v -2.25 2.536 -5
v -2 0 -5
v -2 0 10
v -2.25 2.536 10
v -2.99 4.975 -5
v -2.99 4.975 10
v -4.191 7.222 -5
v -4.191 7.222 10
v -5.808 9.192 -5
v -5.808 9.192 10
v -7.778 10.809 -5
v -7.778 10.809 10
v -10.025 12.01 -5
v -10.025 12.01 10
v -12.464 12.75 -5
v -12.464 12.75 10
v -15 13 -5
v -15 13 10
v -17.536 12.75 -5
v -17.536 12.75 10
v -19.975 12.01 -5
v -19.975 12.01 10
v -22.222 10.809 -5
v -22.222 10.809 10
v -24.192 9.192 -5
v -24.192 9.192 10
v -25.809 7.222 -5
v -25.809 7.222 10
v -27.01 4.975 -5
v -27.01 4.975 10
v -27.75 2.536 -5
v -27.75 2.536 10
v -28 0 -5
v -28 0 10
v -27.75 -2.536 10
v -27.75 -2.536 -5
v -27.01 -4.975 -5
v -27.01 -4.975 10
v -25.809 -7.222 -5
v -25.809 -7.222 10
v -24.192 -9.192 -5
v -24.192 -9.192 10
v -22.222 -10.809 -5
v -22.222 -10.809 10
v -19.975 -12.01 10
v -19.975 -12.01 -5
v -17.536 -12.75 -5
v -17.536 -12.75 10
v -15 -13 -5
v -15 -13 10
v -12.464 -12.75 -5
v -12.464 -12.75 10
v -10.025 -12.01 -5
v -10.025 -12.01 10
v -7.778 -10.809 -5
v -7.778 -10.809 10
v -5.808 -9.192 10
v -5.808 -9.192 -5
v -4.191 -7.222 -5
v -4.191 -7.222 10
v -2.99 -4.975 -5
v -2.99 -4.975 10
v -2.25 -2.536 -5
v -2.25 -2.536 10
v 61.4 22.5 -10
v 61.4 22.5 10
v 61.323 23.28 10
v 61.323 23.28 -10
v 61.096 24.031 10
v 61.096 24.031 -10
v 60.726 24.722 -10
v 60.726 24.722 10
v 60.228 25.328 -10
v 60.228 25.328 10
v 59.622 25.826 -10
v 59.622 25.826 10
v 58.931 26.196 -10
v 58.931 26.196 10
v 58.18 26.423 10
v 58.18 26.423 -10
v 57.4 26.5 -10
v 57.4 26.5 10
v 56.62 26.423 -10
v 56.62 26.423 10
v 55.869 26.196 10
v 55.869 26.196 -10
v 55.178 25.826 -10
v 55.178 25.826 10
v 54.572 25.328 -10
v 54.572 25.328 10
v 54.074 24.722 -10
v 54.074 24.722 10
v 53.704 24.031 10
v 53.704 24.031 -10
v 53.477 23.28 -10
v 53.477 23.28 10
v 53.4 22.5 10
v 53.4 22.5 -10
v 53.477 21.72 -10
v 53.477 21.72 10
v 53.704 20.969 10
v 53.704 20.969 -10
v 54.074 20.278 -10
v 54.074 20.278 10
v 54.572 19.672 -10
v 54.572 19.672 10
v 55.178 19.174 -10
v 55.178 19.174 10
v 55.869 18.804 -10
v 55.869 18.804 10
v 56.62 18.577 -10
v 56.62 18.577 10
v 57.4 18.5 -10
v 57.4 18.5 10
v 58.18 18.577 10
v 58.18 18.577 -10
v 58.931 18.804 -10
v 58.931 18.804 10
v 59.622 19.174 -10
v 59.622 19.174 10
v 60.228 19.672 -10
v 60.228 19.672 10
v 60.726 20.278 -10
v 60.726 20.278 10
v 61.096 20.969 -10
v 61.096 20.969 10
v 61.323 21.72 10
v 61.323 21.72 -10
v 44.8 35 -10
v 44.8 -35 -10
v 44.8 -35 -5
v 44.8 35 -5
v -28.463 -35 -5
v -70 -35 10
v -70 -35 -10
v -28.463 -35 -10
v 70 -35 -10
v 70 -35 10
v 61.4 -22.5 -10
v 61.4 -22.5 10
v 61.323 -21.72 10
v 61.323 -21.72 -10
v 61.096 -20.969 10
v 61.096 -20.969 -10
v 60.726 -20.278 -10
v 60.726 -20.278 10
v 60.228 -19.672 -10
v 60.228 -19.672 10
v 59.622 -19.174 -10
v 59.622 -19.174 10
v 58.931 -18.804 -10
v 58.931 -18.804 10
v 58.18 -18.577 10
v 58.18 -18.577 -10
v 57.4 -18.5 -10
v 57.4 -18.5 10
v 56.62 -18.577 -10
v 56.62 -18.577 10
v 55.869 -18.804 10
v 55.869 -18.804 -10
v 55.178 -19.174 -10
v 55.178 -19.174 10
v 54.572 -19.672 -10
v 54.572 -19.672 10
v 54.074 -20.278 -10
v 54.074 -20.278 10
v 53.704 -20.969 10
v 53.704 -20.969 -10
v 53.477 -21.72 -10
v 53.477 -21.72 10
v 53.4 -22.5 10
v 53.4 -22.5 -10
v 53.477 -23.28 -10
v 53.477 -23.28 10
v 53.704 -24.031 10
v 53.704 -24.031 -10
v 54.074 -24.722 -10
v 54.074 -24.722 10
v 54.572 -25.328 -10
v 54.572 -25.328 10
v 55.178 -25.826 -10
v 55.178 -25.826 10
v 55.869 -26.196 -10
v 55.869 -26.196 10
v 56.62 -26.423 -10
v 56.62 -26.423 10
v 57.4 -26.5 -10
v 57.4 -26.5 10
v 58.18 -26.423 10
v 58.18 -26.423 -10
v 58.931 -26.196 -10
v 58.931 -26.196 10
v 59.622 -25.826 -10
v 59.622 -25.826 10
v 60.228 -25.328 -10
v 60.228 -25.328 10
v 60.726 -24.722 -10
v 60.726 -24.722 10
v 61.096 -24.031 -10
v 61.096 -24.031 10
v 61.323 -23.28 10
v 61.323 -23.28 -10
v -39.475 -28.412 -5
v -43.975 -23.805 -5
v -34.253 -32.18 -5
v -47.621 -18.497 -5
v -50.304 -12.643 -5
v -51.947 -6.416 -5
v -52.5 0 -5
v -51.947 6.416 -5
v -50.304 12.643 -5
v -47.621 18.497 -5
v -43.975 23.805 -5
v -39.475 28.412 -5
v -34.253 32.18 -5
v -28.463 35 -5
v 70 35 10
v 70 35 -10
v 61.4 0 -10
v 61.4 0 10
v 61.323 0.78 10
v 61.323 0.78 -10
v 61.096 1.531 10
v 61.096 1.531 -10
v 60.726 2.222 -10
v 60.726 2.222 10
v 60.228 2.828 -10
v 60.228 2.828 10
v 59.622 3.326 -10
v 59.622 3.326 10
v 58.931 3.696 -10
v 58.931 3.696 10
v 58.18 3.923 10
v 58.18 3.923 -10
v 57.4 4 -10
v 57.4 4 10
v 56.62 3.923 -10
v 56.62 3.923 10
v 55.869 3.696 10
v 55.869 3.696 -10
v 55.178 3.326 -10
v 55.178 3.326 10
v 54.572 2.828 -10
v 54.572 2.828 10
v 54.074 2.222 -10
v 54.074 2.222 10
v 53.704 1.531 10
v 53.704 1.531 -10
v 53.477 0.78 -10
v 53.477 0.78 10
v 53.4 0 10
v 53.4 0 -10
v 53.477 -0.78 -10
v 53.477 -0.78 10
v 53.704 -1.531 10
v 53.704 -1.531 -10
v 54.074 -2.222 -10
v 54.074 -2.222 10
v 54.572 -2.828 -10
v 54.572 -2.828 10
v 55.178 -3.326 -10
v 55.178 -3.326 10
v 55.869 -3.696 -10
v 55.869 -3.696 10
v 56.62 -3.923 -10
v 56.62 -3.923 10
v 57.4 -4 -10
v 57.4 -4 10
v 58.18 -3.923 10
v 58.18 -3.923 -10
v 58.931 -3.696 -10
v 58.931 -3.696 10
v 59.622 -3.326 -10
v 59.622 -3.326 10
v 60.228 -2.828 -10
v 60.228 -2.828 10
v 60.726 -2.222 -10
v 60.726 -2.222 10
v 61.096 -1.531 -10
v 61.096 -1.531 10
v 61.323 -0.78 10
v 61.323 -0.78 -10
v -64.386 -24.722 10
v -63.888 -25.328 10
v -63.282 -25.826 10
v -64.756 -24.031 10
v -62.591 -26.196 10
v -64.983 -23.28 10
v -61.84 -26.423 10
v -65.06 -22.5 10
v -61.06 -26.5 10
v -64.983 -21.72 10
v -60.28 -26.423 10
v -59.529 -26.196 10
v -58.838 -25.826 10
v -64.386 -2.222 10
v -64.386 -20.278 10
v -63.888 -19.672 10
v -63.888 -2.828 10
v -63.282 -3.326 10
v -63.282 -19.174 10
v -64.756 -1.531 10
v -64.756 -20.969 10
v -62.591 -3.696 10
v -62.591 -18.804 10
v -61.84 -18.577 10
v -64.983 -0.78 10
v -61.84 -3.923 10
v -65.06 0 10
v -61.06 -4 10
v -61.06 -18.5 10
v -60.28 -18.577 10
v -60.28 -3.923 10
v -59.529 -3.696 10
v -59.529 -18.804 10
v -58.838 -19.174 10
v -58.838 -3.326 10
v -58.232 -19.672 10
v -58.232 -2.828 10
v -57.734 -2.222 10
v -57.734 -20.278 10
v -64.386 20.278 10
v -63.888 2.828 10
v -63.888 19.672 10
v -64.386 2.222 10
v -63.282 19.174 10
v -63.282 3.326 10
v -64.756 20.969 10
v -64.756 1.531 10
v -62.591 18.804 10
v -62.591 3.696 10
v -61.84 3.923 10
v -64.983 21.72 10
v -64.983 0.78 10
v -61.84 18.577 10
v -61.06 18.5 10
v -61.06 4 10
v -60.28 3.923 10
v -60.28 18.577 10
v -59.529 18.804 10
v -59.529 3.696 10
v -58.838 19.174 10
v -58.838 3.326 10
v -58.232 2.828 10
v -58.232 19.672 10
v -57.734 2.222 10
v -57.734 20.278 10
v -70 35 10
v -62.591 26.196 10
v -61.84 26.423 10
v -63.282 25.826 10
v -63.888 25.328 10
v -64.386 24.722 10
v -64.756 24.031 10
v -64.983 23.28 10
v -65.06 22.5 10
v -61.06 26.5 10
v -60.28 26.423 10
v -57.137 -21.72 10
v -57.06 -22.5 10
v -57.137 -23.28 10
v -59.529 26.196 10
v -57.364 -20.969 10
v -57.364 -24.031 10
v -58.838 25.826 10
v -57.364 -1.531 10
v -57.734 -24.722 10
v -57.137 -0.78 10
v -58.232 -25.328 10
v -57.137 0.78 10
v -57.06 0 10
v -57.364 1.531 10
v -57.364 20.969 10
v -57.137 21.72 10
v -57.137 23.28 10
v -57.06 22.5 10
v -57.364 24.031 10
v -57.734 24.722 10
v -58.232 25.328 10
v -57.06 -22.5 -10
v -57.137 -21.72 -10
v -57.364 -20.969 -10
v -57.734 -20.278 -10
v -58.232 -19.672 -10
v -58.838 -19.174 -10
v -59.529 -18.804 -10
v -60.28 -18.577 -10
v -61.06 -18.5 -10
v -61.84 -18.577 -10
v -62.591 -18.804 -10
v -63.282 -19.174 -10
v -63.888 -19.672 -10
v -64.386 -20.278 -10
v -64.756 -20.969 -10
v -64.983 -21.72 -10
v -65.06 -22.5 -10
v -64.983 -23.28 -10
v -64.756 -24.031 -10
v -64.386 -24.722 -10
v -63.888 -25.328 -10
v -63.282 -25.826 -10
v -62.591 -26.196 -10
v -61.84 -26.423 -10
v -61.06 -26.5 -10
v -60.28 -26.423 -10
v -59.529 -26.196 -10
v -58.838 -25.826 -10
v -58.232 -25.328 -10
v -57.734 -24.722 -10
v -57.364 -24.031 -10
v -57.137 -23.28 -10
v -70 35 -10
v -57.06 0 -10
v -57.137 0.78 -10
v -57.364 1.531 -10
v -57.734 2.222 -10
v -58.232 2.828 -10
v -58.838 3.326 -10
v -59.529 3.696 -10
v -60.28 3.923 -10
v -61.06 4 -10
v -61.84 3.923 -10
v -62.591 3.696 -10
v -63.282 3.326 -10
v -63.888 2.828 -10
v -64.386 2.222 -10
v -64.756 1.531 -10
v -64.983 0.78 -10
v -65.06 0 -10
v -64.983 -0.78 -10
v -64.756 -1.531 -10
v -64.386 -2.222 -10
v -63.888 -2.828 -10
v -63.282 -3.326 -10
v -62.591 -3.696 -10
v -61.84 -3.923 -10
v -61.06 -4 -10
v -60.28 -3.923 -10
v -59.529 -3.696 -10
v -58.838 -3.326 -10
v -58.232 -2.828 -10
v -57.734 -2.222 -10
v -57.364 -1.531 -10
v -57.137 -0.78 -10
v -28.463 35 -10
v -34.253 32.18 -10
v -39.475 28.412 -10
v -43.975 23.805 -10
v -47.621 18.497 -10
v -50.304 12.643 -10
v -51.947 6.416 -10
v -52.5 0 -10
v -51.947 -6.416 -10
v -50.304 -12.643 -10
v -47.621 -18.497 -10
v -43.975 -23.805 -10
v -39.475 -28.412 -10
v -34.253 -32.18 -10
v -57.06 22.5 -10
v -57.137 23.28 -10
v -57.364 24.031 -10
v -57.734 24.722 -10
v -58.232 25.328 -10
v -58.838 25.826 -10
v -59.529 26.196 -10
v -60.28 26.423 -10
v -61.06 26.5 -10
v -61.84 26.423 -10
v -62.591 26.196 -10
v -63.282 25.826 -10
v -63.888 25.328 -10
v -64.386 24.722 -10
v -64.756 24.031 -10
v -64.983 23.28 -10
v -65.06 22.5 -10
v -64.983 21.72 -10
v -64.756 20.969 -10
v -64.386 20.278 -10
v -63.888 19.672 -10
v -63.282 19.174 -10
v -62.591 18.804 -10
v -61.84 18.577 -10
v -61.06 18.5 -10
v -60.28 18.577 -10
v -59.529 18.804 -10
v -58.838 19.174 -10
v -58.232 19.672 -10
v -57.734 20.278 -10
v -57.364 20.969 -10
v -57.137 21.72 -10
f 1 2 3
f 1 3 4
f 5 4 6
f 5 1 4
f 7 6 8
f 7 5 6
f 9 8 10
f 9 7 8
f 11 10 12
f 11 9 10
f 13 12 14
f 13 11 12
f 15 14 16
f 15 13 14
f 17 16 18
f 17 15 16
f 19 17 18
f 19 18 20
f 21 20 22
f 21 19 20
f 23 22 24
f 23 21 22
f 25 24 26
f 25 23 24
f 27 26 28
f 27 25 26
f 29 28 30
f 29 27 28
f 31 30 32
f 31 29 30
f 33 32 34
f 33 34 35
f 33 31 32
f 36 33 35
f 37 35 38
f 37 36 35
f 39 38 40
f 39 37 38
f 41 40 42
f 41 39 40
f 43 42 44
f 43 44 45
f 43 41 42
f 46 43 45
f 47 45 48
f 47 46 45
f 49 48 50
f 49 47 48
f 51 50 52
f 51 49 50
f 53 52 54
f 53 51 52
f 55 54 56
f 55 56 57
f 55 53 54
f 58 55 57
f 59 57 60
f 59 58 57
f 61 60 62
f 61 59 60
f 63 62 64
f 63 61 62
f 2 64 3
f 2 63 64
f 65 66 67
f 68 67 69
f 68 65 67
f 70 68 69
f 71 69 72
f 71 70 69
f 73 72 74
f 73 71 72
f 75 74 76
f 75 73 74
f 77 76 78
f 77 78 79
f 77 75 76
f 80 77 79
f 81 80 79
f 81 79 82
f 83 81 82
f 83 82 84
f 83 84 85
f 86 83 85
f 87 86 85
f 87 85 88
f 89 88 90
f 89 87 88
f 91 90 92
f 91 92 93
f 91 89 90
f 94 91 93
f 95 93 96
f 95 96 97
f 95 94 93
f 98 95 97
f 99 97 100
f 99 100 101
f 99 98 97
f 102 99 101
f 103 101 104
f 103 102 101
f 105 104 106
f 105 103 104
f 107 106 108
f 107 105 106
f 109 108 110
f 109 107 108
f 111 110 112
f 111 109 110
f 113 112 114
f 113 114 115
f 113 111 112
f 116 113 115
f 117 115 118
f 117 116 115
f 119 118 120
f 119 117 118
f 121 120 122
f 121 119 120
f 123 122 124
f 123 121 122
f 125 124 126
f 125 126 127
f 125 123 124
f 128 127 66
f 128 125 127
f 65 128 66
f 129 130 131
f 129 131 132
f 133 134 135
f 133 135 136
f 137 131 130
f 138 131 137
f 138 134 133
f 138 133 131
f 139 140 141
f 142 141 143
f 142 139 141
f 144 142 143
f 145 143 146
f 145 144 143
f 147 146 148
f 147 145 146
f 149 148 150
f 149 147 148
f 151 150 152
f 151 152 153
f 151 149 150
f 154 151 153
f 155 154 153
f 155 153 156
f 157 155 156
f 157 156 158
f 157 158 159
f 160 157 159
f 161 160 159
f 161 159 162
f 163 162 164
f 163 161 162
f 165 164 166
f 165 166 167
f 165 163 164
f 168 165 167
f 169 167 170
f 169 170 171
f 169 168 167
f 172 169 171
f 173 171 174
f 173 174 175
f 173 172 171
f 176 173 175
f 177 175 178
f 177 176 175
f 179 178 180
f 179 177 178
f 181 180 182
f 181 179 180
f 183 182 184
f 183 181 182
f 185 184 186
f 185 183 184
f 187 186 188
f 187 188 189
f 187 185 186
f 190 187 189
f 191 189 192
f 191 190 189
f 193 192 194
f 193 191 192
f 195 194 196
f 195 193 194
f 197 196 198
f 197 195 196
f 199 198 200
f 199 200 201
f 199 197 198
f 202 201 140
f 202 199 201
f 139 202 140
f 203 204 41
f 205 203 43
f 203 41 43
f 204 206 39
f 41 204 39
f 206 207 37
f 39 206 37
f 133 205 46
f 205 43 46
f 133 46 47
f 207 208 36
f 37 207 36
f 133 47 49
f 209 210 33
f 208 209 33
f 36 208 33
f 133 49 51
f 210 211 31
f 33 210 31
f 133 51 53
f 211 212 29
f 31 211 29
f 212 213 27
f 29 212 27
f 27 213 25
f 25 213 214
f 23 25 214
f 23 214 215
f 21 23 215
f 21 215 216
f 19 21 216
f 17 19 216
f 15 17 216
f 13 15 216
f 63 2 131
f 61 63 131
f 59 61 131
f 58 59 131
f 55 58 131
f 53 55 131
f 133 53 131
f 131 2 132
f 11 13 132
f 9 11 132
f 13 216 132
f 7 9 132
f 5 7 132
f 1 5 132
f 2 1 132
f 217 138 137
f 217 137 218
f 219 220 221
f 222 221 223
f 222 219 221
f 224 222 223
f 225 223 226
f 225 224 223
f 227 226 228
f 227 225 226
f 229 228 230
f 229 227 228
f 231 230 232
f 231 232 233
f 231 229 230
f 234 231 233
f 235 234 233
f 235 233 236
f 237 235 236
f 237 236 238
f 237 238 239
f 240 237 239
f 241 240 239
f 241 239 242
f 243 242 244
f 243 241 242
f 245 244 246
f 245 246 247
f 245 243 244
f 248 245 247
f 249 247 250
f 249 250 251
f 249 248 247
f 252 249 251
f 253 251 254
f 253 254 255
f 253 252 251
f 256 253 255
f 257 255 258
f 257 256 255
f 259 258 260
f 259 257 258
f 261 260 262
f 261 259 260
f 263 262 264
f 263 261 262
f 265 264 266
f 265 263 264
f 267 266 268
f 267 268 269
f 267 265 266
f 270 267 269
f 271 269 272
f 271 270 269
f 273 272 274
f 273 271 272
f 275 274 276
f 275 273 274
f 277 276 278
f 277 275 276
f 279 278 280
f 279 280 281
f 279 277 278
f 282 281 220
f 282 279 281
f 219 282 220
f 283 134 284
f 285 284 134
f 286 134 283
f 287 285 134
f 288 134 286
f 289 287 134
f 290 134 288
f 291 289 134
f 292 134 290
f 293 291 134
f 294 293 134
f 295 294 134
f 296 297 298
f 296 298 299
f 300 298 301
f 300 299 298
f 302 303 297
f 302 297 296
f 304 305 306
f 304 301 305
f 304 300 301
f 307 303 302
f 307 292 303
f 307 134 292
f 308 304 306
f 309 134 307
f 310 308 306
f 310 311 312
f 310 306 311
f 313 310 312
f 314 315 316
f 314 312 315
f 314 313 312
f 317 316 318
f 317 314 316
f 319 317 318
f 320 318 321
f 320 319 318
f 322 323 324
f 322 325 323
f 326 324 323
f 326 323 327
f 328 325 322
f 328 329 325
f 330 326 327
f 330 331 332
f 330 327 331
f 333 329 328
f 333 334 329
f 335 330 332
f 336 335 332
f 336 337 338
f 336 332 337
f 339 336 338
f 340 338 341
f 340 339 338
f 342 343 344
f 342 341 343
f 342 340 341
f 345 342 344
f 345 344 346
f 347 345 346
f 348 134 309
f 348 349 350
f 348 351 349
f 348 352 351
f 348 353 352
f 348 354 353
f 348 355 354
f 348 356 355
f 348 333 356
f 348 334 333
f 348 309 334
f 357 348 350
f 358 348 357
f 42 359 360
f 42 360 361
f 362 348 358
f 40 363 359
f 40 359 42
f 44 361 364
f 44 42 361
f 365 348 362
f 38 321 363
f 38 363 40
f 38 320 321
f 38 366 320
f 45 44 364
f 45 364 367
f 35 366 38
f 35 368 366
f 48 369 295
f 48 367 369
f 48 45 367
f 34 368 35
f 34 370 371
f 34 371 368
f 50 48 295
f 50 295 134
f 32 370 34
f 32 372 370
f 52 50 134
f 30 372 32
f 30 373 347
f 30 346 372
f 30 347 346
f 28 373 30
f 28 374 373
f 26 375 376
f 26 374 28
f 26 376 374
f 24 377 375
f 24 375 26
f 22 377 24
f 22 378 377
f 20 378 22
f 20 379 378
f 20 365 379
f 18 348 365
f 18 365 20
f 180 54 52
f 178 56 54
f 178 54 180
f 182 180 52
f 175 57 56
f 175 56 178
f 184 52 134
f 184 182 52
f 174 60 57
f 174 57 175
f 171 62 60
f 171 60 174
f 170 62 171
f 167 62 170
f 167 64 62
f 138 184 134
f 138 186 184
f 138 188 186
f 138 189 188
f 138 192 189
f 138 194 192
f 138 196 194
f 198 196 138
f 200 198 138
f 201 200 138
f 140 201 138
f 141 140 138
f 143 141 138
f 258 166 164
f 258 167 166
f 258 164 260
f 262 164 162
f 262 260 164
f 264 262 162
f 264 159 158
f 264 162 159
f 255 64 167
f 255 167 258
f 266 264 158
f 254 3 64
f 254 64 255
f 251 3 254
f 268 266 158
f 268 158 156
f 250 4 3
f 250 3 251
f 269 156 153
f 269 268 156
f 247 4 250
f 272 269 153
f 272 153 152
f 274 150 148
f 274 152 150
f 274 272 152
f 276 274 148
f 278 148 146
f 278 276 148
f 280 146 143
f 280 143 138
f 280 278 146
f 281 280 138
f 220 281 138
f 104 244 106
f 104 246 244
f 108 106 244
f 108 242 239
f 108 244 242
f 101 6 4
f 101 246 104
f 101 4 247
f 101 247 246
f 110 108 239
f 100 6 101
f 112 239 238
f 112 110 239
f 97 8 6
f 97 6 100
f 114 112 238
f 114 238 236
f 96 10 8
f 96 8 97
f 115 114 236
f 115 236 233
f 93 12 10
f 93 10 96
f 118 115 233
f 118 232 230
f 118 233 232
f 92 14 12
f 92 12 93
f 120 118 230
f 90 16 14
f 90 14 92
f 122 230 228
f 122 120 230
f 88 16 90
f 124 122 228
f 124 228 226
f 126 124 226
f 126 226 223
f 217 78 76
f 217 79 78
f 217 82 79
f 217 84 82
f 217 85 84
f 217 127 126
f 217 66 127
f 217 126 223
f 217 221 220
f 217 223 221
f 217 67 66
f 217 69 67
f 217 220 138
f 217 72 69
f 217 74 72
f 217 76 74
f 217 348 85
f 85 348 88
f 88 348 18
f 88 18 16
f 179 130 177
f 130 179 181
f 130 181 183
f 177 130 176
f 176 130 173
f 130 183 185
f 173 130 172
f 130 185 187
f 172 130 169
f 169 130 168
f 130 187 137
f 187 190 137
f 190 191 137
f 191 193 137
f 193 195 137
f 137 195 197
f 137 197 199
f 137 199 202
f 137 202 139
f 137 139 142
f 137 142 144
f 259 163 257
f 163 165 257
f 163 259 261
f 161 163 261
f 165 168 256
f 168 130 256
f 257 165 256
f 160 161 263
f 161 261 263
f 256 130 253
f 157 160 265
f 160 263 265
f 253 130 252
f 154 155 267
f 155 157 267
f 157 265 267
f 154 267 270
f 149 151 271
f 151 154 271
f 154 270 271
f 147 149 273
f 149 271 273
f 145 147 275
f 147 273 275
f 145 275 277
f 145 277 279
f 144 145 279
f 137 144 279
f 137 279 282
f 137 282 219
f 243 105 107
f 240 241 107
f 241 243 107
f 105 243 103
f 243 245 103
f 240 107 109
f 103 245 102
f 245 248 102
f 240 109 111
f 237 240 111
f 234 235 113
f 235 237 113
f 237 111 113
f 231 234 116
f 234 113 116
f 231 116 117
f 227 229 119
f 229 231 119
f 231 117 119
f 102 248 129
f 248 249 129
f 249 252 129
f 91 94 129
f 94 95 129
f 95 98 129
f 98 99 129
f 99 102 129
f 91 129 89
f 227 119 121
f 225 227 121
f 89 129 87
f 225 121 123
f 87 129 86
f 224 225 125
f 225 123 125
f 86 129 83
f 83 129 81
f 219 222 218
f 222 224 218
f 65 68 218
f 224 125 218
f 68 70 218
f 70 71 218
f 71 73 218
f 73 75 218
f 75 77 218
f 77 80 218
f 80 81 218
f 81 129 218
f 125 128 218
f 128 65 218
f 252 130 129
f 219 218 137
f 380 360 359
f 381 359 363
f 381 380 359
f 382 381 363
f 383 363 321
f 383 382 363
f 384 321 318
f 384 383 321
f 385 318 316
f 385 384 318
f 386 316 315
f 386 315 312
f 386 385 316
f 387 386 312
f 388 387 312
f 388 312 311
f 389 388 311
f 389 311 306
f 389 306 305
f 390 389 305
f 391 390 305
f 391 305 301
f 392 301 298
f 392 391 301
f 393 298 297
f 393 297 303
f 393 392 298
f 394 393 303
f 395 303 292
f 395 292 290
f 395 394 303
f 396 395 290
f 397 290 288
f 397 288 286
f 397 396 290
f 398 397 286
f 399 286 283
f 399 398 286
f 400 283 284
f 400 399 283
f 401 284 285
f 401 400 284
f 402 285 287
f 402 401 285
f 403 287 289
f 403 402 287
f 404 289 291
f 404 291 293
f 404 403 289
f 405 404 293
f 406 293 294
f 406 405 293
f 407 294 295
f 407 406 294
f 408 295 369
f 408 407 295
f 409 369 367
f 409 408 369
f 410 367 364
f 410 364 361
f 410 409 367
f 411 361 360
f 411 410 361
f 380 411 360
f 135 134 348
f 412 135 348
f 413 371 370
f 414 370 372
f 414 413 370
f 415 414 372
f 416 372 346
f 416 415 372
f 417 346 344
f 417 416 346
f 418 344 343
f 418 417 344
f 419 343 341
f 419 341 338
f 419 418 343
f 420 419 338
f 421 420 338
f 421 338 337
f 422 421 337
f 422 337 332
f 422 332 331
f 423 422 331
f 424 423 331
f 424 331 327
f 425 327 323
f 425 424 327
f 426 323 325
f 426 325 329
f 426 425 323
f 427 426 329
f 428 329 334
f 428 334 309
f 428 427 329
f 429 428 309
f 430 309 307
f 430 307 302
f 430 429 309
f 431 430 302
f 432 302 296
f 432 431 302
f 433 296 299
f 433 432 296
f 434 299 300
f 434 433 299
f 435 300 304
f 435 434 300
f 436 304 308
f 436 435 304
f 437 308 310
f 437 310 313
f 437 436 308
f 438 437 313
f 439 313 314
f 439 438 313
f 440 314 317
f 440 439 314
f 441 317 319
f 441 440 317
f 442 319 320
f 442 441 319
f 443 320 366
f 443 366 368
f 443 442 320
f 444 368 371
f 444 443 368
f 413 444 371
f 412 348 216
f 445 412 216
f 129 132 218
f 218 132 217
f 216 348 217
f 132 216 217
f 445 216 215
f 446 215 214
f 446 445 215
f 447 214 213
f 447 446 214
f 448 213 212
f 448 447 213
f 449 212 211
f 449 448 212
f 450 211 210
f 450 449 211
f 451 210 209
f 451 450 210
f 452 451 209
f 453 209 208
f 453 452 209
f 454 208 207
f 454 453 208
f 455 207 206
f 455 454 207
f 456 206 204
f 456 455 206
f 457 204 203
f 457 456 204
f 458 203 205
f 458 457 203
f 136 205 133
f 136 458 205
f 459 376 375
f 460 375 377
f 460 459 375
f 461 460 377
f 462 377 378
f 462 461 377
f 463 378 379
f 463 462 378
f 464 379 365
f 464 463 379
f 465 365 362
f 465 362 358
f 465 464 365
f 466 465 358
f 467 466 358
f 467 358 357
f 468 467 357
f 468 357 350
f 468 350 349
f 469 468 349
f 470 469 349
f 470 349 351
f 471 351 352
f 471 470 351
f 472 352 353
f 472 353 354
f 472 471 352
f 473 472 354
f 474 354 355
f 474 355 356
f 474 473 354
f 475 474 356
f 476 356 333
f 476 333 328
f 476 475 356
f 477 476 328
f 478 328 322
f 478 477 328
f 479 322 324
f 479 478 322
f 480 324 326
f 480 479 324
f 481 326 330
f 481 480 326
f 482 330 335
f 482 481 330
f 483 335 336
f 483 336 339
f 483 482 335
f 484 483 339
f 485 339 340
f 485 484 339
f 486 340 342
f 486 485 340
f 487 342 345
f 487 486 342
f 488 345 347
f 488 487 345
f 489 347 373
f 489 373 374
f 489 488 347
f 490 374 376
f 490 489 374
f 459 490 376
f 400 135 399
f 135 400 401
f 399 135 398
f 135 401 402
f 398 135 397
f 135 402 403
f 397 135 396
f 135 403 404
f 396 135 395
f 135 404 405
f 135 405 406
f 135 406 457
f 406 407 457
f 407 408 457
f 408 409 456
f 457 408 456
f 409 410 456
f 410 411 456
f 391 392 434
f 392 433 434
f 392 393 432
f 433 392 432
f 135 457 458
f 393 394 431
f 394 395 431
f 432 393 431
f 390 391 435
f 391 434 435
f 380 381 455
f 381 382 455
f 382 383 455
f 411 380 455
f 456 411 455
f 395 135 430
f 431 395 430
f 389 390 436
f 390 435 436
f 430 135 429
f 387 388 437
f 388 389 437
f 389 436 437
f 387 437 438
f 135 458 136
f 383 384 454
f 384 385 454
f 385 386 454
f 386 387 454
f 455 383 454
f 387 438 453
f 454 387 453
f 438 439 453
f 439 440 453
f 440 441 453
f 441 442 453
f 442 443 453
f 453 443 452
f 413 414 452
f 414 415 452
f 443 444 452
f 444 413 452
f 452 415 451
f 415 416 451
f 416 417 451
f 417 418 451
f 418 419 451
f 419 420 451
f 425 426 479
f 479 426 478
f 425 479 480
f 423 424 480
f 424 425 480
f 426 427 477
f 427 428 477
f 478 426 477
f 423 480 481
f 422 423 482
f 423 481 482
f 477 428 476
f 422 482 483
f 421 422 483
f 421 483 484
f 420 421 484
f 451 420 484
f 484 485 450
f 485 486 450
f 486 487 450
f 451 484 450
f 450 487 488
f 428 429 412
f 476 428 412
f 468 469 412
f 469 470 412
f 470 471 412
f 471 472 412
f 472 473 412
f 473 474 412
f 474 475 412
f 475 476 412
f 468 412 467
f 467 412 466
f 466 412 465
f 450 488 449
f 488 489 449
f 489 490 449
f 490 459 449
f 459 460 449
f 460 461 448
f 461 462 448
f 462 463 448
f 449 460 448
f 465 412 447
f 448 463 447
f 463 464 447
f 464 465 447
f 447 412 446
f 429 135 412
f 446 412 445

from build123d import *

# Parameters (mm, degrees)
SKETCH1_W           = 140
SKETCH1_H           = 70
SKETCH1_R           = 13
SKETCH1_R_2         = 4
BOSS_EXTRUDE1_DEPTH = 10
CUT_EXTRUDE1_DEPTH  = 5


with BuildPart() as part:
    # Sketch1 → Boss-Extrude1 (new body, symmetric)
    with BuildSketch(Plane.XY):
        Rectangle(SKETCH1_W, SKETCH1_H)
        with Locations((-15, 0)):
            Circle(SKETCH1_R, mode=Mode.SUBTRACT)
        with Locations((57.4, 0)):
            Circle(SKETCH1_R_2, mode=Mode.SUBTRACT)
        with Locations((57.4, 22.5)):
            Circle(SKETCH1_R_2, mode=Mode.SUBTRACT)
        with Locations((-61.06, 0)):
            Circle(SKETCH1_R_2, mode=Mode.SUBTRACT)
        with Locations((-61.06, 22.5)):
            Circle(SKETCH1_R_2, mode=Mode.SUBTRACT)
        with Locations((-61.06, -22.5)):
            Circle(SKETCH1_R_2, mode=Mode.SUBTRACT)
        with Locations((57.4, -22.5)):
            Circle(SKETCH1_R_2, mode=Mode.SUBTRACT)
    extrude(amount=BOSS_EXTRUDE1_DEPTH, both=True)

    # Sketch2 → Cut-Extrude1 (cut)
    with BuildSketch(Plane(origin=(0, 0, -10), x_dir=(-1, 0, 0), z_dir=(0, 0, -1))):
        with BuildLine():
            Line((15, -37.5), (-44.8, -37.5))
            Line((-44.8, -37.5), (-44.8, 37.5))
            Line((-44.8, 37.5), (15, 37.5))
            ThreePointArc((15, 37.5), (52.5, 0), (15, -37.5))
        make_face()
    extrude(amount=-CUT_EXTRUDE1_DEPTH, mode=Mode.SUBTRACT)


solid = part.part
